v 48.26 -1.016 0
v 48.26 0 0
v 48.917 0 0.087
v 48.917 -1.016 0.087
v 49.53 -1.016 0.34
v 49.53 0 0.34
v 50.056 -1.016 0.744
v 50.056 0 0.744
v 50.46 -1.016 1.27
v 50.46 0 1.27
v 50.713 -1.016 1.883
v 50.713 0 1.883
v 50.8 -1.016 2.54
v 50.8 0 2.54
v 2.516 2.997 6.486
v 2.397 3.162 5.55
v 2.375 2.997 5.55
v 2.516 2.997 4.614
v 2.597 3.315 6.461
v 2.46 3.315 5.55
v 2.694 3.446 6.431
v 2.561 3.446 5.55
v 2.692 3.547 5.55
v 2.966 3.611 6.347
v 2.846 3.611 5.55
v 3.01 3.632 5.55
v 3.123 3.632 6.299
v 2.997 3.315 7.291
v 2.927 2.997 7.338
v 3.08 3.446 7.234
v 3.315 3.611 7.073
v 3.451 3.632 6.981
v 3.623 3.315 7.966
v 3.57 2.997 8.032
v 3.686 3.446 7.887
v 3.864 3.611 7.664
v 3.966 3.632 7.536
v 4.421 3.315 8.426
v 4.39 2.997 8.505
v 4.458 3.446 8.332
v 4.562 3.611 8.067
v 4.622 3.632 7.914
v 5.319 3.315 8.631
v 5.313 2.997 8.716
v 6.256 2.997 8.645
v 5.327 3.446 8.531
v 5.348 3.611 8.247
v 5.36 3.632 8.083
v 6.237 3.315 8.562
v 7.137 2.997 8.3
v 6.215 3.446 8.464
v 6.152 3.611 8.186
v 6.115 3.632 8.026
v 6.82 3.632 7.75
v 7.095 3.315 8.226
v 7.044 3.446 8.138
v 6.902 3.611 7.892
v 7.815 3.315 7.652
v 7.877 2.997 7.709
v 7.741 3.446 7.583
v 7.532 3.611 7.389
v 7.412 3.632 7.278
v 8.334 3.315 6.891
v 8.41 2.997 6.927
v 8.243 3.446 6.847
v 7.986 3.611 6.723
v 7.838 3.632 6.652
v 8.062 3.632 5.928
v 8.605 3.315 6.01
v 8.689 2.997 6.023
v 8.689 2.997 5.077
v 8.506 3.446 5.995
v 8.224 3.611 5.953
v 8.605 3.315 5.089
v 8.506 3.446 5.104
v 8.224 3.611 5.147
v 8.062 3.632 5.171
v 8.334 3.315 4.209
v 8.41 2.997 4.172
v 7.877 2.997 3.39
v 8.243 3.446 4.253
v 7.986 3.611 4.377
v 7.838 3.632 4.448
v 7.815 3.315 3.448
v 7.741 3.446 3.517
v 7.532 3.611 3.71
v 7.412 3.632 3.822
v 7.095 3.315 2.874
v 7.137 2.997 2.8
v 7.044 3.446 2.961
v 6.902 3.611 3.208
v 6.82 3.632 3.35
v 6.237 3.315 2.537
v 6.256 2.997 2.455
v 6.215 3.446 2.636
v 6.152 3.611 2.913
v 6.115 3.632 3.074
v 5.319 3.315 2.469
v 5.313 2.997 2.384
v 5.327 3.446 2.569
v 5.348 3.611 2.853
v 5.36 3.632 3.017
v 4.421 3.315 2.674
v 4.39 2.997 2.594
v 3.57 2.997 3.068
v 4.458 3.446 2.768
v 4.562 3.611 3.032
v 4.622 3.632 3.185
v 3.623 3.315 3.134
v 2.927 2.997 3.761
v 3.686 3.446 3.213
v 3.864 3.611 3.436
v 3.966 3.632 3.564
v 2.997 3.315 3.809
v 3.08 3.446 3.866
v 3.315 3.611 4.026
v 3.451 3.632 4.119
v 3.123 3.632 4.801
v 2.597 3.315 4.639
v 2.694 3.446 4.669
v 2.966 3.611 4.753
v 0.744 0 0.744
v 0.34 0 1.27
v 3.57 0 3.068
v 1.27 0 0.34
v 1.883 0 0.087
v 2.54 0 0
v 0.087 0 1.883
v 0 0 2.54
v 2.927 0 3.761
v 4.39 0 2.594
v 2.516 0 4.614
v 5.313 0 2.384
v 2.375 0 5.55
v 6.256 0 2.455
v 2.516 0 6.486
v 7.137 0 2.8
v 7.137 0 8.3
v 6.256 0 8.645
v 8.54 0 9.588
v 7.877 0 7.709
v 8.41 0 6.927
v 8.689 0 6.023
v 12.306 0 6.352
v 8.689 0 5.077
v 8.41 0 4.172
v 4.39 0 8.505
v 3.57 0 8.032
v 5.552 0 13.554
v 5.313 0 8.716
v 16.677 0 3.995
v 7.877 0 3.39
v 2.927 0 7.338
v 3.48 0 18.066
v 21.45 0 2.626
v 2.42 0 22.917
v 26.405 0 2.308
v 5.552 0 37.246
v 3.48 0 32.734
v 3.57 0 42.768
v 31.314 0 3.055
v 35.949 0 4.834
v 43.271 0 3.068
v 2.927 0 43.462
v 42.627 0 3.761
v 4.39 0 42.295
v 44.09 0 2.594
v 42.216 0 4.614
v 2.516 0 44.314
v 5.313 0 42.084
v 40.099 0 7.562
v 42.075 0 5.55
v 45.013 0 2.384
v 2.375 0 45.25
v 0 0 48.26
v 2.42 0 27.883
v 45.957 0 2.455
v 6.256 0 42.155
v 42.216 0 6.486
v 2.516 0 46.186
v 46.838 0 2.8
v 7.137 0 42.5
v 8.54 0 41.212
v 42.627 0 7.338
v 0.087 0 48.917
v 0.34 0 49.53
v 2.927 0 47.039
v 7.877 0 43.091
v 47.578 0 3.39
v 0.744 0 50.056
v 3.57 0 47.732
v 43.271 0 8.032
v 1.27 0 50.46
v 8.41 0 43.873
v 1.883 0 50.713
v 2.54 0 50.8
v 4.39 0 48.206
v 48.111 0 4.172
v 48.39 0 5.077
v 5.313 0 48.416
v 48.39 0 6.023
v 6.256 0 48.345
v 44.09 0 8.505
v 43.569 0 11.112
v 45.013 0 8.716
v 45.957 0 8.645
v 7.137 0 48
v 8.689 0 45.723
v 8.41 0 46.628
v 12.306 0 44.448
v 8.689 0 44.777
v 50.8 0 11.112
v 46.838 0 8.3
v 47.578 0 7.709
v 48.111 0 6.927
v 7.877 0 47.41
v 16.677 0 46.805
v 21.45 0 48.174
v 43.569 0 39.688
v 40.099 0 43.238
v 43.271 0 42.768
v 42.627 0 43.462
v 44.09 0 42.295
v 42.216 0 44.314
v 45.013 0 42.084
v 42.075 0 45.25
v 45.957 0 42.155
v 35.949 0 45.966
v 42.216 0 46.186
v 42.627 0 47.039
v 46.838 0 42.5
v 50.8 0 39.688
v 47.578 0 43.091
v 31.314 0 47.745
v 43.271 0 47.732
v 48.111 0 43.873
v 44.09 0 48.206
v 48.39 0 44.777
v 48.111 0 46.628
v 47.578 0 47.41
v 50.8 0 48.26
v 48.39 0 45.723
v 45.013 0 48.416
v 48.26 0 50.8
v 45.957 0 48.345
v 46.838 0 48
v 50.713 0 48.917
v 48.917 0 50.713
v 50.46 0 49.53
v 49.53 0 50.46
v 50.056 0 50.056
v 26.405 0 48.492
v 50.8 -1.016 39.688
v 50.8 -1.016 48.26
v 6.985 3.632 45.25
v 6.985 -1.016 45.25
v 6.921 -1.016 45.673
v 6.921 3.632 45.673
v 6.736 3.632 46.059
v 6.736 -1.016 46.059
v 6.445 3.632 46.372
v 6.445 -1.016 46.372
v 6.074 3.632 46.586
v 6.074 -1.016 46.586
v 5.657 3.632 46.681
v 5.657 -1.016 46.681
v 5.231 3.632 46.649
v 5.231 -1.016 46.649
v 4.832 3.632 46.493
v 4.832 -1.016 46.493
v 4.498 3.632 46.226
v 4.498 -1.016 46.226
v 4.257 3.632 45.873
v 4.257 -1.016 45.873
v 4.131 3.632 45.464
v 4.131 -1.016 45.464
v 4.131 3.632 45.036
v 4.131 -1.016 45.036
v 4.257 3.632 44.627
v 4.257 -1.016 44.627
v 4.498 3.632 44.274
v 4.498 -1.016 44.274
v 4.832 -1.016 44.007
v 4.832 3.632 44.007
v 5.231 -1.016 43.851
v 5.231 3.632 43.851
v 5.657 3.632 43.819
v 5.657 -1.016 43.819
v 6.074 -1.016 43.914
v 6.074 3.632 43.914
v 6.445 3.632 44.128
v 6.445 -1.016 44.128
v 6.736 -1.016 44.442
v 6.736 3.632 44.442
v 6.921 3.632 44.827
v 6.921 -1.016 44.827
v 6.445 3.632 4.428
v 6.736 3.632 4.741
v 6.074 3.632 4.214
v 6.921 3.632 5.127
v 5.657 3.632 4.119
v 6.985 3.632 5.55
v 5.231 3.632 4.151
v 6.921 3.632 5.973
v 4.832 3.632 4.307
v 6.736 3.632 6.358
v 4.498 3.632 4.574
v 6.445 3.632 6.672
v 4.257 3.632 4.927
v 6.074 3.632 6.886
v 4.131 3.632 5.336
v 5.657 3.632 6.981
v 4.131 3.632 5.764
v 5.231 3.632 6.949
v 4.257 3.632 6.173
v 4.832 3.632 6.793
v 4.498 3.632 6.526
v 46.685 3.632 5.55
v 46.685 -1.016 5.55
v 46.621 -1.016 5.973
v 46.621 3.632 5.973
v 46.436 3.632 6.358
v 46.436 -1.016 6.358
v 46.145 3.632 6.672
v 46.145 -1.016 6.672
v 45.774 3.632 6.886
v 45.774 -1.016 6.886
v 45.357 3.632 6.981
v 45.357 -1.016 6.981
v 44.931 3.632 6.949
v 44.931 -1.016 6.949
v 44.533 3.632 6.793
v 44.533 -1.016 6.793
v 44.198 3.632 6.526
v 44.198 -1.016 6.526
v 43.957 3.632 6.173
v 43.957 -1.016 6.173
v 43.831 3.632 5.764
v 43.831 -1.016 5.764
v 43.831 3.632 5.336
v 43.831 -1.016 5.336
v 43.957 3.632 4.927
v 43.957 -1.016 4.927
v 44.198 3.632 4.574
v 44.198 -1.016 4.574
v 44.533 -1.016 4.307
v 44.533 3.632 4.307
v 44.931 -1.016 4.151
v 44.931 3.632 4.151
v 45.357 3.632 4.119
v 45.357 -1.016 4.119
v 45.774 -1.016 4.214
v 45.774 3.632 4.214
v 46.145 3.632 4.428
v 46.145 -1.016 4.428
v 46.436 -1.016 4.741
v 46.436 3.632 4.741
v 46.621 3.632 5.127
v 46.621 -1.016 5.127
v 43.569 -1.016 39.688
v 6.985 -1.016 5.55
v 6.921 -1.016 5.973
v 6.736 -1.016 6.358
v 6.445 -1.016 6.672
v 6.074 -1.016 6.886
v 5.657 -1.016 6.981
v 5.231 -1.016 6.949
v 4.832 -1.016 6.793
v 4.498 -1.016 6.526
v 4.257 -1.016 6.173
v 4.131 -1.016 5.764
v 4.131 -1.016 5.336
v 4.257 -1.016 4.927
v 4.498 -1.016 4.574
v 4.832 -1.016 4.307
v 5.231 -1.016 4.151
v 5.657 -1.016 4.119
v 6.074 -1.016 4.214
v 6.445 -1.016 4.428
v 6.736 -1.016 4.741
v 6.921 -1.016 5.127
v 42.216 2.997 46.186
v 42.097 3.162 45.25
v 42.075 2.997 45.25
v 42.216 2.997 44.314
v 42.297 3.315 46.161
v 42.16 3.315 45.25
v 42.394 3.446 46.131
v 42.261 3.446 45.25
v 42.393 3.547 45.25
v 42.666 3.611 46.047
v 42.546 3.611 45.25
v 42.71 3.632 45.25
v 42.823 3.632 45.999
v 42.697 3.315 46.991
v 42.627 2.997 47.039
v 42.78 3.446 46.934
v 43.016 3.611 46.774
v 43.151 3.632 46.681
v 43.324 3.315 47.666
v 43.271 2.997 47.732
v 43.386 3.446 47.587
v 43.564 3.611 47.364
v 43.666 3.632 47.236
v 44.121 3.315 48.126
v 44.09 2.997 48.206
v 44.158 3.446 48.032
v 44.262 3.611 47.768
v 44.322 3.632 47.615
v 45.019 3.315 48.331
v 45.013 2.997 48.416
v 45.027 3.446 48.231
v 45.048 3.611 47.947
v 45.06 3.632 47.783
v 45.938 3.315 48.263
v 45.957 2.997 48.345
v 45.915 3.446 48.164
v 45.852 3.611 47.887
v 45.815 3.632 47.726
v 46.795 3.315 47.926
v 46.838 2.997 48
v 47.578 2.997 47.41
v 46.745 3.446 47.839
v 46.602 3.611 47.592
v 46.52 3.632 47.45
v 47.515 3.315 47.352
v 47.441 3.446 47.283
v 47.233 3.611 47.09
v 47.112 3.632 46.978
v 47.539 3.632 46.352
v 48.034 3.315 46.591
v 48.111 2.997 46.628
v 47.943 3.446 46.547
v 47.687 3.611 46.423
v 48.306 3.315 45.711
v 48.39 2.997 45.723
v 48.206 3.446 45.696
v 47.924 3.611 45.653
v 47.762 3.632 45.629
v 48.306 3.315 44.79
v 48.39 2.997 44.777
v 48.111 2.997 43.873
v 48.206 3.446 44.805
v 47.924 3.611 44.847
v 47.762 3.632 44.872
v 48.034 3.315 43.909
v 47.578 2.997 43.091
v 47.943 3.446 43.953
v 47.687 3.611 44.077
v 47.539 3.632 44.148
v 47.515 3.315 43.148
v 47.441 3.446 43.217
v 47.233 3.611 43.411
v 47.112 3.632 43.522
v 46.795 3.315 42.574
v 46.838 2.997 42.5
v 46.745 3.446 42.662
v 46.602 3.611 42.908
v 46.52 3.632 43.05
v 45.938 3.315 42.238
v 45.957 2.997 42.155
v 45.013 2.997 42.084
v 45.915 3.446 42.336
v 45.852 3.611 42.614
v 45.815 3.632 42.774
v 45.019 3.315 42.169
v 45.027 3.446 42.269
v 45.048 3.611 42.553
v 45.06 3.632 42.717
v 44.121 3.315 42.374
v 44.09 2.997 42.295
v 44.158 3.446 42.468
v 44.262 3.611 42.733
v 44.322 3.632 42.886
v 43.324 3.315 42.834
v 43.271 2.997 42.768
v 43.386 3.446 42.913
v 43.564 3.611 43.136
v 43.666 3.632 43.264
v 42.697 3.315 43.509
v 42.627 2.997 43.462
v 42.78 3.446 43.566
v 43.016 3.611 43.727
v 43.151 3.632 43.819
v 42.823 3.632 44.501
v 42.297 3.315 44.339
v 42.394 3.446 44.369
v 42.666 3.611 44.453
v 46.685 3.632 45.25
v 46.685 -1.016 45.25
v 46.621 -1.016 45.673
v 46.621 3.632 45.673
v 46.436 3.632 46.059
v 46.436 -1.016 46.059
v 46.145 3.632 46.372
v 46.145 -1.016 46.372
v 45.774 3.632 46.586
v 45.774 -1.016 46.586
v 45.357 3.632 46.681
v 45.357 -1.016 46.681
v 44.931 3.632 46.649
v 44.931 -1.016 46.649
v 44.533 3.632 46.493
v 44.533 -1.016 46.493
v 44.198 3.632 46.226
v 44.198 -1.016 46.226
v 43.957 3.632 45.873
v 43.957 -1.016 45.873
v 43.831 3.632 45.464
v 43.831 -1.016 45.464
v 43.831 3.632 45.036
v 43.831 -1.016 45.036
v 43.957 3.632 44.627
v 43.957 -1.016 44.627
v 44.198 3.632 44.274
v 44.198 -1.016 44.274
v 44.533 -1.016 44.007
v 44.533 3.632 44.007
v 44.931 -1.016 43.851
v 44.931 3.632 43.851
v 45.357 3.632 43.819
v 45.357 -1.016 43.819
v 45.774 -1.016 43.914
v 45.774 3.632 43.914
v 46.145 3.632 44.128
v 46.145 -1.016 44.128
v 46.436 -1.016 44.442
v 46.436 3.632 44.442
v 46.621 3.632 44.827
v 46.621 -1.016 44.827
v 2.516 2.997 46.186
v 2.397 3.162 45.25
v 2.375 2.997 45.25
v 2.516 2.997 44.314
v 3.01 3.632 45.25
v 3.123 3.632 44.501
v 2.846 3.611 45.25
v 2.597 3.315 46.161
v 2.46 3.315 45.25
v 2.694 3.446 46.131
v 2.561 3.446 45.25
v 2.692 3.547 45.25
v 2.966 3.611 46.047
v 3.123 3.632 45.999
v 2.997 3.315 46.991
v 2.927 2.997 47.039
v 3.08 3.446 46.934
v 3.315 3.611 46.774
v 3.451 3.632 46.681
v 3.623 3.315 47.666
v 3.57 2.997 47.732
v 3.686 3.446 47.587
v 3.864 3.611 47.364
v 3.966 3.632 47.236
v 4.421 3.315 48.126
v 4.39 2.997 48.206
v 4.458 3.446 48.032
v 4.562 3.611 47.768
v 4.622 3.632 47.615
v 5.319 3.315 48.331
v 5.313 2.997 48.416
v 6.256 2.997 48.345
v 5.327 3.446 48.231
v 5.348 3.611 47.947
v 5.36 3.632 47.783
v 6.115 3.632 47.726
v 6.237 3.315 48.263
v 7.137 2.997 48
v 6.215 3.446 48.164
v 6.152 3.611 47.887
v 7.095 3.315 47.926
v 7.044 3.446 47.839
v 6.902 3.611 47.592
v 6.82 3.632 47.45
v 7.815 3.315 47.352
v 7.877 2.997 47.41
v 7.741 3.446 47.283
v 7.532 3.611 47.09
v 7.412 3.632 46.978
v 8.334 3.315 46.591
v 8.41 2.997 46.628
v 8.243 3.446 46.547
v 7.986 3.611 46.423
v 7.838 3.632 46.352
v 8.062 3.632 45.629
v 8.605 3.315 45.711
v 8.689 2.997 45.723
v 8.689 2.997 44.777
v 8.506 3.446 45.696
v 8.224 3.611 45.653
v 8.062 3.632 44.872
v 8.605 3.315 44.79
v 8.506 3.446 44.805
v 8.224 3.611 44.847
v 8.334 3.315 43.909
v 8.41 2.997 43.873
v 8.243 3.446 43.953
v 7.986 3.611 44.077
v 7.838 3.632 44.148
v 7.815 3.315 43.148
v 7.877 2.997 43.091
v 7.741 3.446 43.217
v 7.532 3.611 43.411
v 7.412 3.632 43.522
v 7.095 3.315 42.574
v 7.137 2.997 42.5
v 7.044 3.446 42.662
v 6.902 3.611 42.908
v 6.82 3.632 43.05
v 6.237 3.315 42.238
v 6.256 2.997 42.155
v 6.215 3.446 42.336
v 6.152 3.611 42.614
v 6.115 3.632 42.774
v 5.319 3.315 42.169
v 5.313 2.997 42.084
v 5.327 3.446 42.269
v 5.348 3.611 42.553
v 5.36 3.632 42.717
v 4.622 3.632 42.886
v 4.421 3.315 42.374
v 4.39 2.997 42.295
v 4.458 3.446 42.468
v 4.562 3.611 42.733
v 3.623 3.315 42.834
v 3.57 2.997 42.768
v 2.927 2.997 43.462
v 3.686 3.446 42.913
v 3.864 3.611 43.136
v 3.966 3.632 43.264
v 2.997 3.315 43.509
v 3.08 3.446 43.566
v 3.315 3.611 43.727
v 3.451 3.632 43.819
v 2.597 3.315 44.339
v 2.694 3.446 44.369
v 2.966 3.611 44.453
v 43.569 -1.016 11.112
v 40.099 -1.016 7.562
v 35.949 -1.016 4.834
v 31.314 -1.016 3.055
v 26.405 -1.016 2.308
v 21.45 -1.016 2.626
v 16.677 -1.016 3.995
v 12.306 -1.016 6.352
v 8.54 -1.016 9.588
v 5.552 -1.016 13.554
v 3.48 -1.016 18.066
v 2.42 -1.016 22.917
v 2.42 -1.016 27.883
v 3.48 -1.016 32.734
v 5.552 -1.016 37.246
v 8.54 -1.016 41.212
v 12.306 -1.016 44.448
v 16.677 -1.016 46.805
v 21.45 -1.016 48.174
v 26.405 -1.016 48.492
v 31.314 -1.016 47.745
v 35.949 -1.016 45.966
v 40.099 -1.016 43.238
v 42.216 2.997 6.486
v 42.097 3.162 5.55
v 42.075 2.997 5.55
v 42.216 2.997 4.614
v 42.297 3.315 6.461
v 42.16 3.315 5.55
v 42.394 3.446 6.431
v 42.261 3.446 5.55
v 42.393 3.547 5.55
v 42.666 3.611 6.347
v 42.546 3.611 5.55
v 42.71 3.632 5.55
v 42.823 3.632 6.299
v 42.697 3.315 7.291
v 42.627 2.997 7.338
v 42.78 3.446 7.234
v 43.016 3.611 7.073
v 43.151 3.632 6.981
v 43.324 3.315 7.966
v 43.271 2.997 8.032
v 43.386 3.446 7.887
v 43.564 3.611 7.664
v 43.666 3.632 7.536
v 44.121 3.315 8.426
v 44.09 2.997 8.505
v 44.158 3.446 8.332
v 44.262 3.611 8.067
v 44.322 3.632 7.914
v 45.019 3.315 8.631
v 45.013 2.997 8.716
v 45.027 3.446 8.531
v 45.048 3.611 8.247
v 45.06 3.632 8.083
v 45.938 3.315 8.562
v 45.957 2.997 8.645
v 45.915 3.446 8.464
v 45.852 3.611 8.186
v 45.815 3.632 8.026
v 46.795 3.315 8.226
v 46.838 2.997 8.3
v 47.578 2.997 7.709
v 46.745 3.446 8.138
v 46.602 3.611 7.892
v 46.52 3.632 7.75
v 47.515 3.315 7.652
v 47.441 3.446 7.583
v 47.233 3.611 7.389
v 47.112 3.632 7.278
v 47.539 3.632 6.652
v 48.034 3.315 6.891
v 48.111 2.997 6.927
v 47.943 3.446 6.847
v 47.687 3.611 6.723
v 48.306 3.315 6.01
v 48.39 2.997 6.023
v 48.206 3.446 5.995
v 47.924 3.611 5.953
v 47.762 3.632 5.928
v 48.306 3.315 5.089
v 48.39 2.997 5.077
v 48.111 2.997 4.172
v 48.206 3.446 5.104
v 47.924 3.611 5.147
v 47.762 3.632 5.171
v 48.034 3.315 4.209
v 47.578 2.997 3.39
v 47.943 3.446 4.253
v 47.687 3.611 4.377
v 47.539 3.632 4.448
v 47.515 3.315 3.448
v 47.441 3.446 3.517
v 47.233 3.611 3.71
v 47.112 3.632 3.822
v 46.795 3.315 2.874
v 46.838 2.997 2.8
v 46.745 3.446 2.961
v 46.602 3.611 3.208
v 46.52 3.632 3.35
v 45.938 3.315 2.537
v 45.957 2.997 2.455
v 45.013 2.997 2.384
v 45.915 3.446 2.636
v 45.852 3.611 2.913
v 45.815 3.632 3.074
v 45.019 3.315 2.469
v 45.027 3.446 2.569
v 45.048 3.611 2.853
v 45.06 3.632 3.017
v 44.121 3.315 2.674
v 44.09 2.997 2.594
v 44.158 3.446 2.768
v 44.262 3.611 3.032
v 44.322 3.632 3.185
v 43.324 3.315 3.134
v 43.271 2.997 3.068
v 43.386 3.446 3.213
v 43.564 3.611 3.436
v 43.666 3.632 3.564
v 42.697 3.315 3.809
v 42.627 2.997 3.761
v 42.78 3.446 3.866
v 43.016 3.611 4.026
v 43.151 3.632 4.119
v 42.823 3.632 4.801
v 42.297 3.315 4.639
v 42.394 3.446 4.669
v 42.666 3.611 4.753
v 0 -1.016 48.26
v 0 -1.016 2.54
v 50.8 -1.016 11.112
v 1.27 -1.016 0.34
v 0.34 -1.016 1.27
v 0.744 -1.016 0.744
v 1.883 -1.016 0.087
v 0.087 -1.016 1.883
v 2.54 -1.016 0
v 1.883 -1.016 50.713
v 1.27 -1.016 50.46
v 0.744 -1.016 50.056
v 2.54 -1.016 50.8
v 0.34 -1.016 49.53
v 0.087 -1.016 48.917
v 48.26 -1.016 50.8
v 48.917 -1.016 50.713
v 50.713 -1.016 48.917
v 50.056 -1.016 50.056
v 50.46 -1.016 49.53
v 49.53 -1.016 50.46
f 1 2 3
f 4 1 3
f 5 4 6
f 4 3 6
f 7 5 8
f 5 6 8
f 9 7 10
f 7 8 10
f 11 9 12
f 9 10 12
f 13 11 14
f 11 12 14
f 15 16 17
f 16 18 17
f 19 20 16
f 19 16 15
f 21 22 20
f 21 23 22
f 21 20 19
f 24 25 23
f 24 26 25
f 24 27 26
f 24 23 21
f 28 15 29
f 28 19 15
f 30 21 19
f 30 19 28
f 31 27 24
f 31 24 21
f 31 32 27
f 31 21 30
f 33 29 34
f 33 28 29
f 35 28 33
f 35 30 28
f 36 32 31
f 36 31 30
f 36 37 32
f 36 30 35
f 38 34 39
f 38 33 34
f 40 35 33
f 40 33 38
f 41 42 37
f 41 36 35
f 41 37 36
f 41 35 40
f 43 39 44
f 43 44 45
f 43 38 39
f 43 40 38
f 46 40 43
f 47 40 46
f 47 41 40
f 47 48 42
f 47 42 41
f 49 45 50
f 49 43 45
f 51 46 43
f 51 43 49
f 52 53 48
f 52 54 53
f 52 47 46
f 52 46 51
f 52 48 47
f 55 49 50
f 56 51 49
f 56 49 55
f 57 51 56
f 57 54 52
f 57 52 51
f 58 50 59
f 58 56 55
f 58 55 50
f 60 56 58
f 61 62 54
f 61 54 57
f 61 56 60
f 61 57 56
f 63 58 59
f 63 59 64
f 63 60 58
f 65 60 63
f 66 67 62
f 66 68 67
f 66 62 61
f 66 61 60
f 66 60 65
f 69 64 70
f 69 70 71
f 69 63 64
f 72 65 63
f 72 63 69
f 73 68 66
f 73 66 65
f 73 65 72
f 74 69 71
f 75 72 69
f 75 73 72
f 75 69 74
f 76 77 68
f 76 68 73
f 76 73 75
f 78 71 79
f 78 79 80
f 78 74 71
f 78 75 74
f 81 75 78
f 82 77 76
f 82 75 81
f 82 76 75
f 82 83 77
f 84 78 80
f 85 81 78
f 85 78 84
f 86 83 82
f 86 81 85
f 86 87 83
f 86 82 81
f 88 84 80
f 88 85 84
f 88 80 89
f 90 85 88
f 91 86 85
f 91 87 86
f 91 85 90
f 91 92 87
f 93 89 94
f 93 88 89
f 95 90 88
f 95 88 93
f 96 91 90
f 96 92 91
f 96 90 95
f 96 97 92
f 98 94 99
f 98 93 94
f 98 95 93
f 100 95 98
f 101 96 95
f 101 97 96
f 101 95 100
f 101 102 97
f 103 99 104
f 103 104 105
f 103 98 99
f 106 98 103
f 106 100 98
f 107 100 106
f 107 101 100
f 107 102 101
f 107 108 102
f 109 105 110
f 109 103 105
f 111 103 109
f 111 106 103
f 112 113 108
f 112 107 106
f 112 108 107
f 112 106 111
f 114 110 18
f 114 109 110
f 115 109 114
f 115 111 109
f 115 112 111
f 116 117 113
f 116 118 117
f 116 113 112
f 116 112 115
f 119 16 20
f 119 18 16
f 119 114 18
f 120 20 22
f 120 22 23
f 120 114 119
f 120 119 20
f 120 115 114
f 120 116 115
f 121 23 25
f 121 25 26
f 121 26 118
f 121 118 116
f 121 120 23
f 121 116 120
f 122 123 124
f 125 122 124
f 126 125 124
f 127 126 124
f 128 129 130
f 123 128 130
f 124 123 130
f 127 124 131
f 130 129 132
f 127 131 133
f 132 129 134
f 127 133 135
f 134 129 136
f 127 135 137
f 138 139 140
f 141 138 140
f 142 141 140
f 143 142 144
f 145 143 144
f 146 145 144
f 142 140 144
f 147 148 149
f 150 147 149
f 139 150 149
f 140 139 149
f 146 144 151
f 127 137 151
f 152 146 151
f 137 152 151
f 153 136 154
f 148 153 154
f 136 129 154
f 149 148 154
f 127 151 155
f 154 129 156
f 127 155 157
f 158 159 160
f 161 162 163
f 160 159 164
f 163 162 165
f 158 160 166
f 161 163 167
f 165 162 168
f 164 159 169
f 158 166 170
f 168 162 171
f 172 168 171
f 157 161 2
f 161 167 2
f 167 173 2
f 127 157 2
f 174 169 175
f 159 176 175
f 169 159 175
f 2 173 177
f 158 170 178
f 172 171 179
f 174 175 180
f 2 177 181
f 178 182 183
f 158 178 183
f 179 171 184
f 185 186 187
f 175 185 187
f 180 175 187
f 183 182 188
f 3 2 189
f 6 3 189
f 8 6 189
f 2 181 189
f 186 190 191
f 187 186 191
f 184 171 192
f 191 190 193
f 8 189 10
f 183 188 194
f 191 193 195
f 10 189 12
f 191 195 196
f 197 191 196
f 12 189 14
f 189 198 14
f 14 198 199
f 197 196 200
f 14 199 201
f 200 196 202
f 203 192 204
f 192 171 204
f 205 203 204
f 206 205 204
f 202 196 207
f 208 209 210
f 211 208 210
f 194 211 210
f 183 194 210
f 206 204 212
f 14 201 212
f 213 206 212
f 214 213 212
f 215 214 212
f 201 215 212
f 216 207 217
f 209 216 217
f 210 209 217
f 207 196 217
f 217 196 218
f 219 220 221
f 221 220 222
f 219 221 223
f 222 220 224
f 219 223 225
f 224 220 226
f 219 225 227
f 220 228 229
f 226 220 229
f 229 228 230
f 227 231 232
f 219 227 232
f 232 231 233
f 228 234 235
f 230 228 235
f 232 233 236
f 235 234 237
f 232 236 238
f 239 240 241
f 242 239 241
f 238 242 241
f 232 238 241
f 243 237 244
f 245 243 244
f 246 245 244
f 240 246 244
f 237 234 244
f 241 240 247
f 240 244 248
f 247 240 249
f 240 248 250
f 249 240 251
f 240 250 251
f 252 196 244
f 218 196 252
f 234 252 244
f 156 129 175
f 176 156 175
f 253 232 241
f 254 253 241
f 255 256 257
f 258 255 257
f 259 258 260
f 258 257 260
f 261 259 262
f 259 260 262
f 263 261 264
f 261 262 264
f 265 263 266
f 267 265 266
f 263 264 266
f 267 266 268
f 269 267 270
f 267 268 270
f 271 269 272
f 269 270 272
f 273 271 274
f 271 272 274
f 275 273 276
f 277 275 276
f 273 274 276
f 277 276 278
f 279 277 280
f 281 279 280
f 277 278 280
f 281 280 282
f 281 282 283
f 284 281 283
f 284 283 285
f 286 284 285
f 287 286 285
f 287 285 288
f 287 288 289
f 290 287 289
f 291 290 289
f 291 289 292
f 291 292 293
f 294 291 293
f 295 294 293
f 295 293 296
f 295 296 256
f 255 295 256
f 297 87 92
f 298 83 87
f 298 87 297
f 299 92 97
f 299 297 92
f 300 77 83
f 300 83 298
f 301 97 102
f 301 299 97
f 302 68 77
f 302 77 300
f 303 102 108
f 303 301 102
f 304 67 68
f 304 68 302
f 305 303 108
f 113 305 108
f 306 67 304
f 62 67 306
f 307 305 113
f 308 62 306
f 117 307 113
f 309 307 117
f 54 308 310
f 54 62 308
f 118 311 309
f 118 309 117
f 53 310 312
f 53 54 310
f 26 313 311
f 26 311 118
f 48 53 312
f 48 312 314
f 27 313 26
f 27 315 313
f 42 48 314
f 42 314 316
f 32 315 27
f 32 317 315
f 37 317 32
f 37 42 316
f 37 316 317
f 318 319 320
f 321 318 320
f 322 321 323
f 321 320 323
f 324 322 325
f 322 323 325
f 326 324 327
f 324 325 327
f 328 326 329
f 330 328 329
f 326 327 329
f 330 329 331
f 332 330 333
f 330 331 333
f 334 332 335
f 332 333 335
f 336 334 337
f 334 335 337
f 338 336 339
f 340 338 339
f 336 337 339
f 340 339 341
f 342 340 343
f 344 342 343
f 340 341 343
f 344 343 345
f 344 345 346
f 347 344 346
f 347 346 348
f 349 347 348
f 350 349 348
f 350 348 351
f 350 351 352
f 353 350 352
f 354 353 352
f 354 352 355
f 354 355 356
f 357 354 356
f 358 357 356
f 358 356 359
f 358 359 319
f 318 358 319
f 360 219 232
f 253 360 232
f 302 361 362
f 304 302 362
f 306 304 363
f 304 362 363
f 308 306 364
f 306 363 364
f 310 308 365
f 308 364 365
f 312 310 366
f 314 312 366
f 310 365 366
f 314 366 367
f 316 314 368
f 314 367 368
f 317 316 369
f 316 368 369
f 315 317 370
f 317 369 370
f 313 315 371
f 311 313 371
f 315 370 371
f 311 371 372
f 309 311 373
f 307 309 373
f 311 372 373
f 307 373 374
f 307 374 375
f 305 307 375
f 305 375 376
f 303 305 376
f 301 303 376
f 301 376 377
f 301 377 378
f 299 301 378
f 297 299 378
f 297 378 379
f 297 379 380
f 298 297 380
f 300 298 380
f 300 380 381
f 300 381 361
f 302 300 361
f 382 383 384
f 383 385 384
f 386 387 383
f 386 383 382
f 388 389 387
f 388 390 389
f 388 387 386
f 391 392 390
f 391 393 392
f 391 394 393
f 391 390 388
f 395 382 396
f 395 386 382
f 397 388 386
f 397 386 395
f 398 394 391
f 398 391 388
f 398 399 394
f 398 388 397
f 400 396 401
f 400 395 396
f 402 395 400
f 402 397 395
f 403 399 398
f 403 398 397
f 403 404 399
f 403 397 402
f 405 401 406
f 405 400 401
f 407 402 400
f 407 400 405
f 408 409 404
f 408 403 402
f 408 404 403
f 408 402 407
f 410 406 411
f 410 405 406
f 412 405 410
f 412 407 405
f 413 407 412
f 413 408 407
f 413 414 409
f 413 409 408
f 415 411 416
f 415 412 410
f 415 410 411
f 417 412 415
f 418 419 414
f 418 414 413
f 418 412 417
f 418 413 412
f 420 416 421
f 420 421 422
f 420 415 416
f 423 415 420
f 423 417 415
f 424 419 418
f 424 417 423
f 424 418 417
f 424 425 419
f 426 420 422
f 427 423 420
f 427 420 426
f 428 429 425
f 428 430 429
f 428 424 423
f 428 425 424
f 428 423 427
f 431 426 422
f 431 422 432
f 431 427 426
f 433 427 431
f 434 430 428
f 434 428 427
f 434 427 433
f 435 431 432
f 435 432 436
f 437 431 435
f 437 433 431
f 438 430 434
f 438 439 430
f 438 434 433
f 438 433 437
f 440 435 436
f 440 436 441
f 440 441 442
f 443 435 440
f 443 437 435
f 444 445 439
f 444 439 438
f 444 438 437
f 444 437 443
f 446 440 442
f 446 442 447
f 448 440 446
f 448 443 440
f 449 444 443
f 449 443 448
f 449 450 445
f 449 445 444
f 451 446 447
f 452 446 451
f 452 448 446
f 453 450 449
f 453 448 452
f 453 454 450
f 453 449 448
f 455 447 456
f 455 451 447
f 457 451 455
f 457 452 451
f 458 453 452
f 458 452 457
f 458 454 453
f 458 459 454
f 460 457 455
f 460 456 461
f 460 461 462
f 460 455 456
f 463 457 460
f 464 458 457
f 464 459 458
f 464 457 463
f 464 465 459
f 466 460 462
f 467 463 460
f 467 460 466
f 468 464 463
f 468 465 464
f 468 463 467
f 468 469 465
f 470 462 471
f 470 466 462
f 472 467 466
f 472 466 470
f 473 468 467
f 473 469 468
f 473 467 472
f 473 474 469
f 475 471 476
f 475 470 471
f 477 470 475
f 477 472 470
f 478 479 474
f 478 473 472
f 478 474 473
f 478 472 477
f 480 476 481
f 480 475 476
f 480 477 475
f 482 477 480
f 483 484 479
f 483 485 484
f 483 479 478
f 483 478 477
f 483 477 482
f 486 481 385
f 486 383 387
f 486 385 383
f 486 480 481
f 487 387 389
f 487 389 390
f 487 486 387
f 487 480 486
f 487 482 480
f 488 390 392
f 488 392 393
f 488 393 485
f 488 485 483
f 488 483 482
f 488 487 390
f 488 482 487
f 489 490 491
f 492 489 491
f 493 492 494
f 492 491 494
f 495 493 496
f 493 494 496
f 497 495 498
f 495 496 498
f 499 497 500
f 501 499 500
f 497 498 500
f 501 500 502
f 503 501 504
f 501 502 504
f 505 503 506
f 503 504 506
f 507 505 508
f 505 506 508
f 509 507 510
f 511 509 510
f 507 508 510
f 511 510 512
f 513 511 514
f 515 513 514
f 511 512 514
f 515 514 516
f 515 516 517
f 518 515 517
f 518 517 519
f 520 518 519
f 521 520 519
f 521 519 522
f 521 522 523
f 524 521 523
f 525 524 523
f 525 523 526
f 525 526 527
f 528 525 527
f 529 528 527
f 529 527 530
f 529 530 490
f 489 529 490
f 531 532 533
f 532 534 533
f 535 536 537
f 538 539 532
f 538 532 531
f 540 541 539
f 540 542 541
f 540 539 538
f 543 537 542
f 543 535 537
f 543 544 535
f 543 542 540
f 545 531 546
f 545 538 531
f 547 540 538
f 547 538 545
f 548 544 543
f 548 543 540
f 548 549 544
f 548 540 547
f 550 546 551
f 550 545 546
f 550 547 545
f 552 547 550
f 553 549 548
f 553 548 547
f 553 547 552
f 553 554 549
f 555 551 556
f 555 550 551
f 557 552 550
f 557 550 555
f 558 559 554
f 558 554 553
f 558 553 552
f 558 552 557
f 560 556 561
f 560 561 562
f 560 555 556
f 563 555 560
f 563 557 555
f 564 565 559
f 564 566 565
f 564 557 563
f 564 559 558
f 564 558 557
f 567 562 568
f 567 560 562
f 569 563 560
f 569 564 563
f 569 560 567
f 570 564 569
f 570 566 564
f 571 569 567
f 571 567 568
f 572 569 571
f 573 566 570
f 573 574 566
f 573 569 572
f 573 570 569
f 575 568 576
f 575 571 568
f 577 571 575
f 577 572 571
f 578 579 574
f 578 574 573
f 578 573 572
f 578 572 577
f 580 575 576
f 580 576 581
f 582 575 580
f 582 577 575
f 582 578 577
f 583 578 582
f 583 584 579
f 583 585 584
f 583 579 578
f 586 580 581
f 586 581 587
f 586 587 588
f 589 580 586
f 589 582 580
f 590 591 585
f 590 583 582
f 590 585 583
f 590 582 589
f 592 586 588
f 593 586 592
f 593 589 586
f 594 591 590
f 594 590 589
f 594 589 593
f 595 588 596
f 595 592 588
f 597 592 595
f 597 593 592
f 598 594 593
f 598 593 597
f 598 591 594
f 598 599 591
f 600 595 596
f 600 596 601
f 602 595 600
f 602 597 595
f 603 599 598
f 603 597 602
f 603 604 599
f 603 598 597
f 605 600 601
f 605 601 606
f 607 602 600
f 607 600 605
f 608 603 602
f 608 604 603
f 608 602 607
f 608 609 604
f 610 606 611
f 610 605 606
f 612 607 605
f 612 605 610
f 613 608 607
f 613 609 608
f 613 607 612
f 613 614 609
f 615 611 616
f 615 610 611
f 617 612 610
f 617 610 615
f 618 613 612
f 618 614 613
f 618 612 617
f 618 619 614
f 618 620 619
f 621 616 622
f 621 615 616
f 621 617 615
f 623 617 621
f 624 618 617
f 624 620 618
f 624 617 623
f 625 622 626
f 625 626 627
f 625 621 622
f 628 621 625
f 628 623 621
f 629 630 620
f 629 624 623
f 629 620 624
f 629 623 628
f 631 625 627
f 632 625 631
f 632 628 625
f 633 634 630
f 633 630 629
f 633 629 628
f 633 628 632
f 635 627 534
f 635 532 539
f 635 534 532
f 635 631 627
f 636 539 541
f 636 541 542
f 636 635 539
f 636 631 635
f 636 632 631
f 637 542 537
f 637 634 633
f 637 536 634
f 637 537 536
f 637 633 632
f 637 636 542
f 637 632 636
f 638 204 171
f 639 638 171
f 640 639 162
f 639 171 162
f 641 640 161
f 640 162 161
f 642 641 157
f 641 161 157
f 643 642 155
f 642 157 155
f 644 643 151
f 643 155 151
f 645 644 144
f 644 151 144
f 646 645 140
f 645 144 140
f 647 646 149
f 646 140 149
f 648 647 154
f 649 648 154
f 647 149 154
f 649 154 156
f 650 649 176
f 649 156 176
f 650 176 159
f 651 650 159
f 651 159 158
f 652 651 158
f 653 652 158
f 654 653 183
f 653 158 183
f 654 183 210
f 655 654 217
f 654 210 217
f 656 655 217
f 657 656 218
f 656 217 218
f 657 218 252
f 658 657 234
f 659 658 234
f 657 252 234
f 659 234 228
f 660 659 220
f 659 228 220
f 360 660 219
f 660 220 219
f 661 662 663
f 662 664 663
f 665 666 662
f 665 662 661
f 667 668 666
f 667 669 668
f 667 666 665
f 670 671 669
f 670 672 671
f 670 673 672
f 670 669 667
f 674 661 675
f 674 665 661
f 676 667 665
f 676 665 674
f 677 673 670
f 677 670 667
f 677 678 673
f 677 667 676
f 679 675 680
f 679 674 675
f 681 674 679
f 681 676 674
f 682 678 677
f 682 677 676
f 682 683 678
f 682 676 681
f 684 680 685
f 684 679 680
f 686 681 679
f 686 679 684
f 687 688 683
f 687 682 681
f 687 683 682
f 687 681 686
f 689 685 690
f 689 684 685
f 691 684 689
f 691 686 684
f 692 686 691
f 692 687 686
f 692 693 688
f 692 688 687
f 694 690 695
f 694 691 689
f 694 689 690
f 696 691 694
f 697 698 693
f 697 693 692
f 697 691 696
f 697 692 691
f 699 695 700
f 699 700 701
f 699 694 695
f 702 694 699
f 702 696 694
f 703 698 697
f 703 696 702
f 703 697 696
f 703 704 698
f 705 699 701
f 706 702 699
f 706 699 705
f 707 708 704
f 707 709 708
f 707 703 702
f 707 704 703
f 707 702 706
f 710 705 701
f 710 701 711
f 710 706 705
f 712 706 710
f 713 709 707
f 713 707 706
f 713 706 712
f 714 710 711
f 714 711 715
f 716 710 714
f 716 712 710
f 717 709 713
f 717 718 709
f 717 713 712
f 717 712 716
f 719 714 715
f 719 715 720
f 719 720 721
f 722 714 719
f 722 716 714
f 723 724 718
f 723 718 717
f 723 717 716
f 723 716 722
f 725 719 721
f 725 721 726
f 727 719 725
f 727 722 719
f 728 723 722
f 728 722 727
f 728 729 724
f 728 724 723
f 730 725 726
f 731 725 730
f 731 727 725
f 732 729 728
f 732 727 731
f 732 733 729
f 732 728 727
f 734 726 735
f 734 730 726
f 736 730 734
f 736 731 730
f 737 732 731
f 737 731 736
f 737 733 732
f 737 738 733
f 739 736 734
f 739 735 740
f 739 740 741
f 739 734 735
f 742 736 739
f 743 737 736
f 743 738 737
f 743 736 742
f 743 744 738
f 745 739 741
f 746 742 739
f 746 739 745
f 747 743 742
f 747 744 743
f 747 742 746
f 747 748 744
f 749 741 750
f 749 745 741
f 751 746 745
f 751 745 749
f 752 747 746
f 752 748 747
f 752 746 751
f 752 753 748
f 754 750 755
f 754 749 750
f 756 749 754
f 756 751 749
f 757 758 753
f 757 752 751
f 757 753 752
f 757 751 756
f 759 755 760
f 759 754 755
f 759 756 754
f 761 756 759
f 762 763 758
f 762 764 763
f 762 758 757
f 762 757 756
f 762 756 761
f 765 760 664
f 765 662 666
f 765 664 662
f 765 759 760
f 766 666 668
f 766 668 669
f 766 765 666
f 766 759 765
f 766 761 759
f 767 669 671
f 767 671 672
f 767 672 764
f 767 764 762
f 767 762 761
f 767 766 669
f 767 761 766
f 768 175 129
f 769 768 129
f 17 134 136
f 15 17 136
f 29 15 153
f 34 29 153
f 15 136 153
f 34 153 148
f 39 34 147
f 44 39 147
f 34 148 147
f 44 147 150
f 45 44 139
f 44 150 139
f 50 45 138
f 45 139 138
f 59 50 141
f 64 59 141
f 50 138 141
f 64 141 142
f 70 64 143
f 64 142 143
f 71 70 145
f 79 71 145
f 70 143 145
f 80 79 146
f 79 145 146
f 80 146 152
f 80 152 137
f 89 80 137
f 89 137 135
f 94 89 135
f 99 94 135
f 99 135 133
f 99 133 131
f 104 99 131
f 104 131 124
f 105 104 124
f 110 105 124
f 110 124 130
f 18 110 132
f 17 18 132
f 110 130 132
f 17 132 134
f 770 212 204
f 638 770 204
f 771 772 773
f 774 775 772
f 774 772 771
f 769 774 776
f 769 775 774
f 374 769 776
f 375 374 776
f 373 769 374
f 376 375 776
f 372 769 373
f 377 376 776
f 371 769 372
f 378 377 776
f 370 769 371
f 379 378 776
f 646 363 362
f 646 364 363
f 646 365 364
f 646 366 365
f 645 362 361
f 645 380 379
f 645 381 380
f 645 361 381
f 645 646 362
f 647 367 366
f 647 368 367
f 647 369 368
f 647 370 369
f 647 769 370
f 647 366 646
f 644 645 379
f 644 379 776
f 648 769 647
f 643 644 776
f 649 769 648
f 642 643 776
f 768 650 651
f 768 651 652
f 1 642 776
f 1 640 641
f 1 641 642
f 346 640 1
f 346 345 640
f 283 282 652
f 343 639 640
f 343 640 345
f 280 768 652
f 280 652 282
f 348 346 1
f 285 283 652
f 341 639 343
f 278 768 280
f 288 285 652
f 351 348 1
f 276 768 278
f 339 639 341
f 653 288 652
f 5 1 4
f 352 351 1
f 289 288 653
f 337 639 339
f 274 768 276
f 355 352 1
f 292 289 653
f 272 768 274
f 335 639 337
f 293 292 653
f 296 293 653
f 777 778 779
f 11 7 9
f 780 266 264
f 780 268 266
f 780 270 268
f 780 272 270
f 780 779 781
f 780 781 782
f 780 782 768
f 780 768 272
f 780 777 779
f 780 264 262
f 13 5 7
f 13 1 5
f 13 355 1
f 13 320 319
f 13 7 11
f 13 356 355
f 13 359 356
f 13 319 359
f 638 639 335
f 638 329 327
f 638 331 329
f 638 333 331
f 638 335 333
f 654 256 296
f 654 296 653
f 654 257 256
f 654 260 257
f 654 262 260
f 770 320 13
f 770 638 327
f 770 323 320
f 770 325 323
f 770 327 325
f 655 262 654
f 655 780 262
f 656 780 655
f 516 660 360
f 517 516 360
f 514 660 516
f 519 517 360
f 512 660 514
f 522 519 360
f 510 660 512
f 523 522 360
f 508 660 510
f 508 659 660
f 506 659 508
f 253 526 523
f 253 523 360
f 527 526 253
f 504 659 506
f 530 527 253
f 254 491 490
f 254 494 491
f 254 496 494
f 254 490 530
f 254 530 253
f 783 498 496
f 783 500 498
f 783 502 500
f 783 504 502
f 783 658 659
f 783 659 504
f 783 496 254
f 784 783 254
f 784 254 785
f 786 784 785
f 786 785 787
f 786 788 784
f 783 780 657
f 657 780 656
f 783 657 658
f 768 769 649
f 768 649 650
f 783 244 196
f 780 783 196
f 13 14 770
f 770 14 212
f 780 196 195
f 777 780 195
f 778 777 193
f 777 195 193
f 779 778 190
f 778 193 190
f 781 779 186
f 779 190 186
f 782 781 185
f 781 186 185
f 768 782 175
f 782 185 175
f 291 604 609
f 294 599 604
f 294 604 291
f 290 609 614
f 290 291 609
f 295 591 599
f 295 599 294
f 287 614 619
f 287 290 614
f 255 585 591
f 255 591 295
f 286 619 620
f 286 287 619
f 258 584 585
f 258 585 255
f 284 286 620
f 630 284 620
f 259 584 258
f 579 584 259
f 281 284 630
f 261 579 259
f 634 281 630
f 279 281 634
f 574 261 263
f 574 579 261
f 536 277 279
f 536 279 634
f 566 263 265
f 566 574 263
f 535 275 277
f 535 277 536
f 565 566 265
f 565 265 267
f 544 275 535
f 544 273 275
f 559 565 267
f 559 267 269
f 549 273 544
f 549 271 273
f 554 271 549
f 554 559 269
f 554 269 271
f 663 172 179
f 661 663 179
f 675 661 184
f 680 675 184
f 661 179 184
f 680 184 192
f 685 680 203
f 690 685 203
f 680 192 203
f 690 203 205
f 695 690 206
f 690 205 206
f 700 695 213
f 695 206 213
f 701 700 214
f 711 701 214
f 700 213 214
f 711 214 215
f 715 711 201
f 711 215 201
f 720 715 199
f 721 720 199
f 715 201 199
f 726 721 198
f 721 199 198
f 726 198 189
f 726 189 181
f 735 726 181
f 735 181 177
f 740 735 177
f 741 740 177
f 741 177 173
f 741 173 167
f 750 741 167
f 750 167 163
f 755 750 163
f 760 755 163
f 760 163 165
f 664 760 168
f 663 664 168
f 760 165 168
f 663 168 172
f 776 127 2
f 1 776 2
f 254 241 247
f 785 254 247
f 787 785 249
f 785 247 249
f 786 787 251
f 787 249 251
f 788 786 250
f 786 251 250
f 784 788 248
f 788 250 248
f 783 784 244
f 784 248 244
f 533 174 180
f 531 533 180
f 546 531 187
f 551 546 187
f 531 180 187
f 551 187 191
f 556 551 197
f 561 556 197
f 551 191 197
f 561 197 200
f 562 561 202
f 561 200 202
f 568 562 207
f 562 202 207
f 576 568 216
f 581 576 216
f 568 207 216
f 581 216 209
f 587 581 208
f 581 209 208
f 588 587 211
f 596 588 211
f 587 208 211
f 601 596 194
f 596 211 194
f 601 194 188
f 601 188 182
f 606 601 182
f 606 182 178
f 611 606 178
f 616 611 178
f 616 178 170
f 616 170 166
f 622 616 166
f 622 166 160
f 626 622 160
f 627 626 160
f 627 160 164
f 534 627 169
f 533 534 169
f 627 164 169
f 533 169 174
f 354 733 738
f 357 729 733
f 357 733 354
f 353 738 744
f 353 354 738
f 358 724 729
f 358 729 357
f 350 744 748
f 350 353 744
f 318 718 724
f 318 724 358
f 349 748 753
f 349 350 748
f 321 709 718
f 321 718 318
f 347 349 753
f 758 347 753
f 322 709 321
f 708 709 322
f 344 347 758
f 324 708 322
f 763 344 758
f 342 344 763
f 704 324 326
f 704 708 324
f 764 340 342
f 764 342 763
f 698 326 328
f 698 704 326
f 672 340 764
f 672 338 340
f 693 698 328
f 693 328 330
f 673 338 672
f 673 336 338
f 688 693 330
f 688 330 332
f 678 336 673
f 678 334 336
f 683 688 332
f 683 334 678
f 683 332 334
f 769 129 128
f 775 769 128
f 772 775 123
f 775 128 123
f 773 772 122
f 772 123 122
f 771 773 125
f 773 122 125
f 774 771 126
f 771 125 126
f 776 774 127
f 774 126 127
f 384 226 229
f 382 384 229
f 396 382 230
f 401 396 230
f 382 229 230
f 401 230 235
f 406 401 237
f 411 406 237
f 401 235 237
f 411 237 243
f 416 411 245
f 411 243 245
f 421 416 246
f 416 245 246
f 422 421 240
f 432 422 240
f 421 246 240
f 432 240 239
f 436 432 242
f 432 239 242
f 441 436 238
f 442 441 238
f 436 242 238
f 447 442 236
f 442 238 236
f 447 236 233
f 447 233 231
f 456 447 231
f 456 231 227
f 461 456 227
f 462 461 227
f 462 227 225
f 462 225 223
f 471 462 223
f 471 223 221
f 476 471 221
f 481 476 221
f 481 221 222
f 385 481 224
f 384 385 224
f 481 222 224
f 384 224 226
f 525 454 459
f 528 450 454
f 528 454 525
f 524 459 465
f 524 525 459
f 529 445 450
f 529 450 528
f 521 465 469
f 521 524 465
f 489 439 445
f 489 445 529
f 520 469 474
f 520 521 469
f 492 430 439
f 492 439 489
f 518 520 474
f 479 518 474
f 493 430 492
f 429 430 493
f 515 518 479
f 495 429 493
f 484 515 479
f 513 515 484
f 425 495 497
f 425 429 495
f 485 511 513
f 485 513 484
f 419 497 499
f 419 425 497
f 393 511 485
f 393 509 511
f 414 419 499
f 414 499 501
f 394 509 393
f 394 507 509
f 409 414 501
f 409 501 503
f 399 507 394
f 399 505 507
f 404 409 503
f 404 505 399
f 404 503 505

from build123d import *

# Parameters (mm, degrees)
F1_DEPTH = 1.016
F2_R     = 3.175
F3_DEPTH = 3.6322
F5_D     = 2.8702
F6_R     = 0.635


with BuildPart() as f1:
    # F0 (on Front) → F1 (new body)
    with BuildSketch(Plane.XZ):
        with BuildLine():
            ThreePointArc((0, 2.54), (0.7439487758, 0.7439487758), (2.54, 0))
            Line((2.54, 0), (48.26, 0))
            ThreePointArc((48.26, 0), (50.0560512242, 0.7439487758), (50.8, 2.54))
            Line((50.8, 2.54), (50.8, 11.1125))
            Line((50.8, 11.1125), (43.5693241413, 11.1125))
            ThreePointArc((43.5693241413, 11.1125), (2.286, 25.4), (43.5693241413, 39.6875))
            Line((43.5693241413, 39.6875), (50.8, 39.6875))
            Line((50.8, 39.6875), (50.8, 48.26))
            ThreePointArc((50.8, 48.26), (50.0560512242, 50.0560512242), (48.26, 50.8))
            Line((48.26, 50.8), (2.54, 50.8))
            ThreePointArc((2.54, 50.8), (0.7439487758, 50.0560512242), (0, 48.26))
            Line((0, 48.26), (0, 2.54))
        make_face()
    extrude(amount=F1_DEPTH)

    # F2 (on face) → F3 (join)
    with BuildSketch(Plane(origin=(0, 0, 0), x_dir=(-1, 0, 0), z_dir=(0, 1, 0))):
        with Locations((-45.2501, 45.2501)):
            Circle(F2_R)
        with Locations((-5.5499, 45.2501)):
            Circle(F2_R)
        with Locations((-5.5499, 5.5499)):
            Circle(F2_R)
        with Locations((-45.2501, 5.5499)):
            Circle(F2_R)
    extrude(amount=F3_DEPTH)

    # F5 (through all)
    with Locations(Plane(origin=(0, 3.6322, 0), x_dir=(-1, 0, 0), z_dir=(0, 1, 0))):
        with Locations((-45.2501, 45.2501), (-5.5499, 45.2501), (-5.5499, 5.5499), (-45.2501, 5.5499)):
            Hole(F5_D / 2)

    # F6
    f6_edges = [f1.edges().sort_by_distance(p)[0] for p in [
        (48.4251, 3.6322, 45.2501),
        (8.7249, 3.6322, 45.2501),
        (8.7249, 3.6322, 5.5499),
        (48.4251, 3.6322, 5.5499),
    ]]
    fillet(f6_edges, radius=F6_R)


solid = f1.part
